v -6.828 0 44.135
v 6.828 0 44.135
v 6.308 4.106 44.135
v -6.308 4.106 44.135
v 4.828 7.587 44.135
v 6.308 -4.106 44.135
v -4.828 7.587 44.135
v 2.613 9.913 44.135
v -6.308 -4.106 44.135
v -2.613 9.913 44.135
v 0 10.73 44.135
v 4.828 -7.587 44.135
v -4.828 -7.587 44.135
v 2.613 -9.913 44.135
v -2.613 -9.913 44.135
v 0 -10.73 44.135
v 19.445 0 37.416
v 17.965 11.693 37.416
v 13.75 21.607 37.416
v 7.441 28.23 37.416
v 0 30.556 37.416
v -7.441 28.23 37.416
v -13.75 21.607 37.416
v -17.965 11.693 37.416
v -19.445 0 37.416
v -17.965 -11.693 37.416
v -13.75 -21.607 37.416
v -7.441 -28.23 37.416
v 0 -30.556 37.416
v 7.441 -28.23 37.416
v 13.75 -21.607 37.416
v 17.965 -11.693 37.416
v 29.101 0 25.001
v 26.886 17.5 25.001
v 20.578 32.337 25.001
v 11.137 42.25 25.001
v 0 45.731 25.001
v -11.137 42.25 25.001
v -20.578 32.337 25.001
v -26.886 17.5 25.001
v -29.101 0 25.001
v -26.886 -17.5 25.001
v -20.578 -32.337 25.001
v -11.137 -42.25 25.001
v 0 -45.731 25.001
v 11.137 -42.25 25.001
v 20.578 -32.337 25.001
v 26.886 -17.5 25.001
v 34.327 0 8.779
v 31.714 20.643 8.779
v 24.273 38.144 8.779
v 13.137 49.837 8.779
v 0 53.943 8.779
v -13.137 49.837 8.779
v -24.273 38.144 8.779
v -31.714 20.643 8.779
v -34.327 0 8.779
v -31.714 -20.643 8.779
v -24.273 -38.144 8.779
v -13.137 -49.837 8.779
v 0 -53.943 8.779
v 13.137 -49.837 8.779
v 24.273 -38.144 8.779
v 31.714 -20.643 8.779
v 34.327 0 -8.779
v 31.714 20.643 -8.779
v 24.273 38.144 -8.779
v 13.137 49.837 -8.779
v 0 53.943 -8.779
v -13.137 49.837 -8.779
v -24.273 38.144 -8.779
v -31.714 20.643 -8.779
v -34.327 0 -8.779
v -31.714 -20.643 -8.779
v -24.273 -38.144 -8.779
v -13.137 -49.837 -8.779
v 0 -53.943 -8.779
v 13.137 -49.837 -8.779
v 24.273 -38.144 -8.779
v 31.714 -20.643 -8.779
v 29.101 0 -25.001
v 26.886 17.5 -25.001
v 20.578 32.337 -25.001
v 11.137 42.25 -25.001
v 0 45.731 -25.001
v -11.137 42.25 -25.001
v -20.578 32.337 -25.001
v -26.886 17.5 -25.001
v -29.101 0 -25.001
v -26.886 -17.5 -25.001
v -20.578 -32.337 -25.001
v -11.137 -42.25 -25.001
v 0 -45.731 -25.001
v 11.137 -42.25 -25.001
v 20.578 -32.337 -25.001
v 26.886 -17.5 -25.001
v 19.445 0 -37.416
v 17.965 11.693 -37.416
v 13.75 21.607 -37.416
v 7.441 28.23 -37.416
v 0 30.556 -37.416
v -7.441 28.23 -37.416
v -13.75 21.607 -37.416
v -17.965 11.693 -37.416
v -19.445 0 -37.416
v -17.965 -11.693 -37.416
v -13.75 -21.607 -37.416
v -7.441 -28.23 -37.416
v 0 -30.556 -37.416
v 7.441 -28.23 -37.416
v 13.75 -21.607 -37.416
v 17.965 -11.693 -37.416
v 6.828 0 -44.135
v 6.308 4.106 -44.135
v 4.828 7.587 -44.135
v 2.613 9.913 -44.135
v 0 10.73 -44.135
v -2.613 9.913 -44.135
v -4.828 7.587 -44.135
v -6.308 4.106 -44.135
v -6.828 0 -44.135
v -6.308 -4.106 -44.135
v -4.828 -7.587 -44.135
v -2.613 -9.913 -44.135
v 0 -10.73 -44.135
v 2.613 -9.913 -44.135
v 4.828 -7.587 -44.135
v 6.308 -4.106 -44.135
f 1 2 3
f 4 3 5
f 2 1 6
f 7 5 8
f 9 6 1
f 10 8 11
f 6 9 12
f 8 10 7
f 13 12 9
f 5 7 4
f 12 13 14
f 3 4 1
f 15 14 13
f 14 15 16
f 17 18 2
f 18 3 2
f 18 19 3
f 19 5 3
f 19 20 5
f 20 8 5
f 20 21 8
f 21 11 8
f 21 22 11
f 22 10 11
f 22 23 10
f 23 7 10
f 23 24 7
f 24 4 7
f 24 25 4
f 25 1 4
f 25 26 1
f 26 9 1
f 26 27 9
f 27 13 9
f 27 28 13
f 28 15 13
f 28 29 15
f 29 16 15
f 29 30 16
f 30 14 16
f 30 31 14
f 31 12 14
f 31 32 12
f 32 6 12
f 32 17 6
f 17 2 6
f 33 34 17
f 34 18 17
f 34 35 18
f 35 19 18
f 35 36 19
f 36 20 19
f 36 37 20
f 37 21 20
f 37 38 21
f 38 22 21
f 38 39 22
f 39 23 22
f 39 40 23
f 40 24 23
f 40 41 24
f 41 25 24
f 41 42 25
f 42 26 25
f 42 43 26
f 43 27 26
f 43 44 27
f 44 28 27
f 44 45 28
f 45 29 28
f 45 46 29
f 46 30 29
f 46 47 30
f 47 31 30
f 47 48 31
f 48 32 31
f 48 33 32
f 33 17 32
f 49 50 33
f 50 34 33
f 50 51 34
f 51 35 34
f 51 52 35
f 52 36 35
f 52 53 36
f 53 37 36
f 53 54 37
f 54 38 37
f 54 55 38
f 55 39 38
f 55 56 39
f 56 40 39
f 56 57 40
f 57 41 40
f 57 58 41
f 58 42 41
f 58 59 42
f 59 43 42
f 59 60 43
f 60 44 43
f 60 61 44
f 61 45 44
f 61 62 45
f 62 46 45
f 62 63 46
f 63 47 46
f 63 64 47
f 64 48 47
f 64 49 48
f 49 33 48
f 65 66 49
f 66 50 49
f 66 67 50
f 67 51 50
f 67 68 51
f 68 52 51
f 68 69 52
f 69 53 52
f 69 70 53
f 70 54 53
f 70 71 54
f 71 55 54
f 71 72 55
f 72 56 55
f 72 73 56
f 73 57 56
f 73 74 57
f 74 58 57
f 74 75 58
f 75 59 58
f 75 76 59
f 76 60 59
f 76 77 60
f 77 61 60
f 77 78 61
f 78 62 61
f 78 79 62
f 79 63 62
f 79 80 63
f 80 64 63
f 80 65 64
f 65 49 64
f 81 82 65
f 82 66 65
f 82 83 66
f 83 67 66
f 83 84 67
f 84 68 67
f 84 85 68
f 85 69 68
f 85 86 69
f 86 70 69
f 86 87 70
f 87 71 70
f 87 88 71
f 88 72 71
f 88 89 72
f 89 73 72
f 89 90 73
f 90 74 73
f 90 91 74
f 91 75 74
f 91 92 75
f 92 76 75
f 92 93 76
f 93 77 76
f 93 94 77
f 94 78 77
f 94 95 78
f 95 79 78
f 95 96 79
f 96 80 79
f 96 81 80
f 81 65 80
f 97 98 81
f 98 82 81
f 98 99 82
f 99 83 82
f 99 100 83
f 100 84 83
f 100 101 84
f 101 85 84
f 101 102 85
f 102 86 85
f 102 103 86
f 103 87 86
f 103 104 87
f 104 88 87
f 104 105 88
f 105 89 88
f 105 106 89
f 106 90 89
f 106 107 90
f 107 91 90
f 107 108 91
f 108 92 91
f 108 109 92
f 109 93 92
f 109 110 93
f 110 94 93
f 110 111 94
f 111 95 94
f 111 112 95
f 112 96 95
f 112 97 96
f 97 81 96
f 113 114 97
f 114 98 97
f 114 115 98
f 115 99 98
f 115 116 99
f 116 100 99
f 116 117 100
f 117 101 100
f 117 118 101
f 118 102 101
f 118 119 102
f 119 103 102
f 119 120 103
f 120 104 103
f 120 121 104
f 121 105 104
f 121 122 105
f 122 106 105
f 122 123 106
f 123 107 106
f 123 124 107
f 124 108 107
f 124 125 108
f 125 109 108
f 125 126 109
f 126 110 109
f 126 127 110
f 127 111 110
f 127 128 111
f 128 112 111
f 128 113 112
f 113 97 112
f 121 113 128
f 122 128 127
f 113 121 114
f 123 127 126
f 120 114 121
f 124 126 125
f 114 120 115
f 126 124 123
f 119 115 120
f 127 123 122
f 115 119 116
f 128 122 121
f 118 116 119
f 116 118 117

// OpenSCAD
// Generated by SolidPython 1.0.1 on 2020-07-29 00:46:47


scale(v = [7, 11, 9]) {
	sphere(r = 5);
}
/***********************************************
*********      SolidPython code:      **********
************************************************
 
# import packages: SolidPython
from solid import *
from solid.utils import *
from itertools import chain, combinations, permutations


class Resize:

    def __init__(self, scad_file):
        self.scad_file = scad_file
        #self.scad_file = import_scad(scad_file)
        # cone/cylinder param:
        self.r1 = 0
        self.r2 = 0
        self.h = 0
        # rectangular prism param:
        self.w = 0
        self.l = 0
        # ellipse param:
        self.r = 0

    # import OpenScad code (file name corresponds to shape)


    # classify shape + parameters
    def assign(self, param1, param2, param3):
        if self.scad_file == 'cone.scad':
            self.r1 = param1
            self.r2 = param2
            self.h = param3
        elif self.scad_file == 'cylinder.scad':
            self.r1 = param1
            self.r2 = param2
            self.h = param3
        elif self.scad_file == 'rectangularPrism.scad':
            self.h = param1
            self.l = param2
            self.w = param3
        else:
            self.r = param1
            self.h = param2

    # resize parameters
    def iterate(self):
        x = range(3, 20, 2)
        i = 1
        if self.scad_file == 'cone.scad':
            tempList = list(permutations(x, 2))
            for temp in tempList:
                param1 = temp[0]
                param2 = temp[1]
                filepath = 'produced_scad_files/' + 'cone' + str(param1) + '_' + str(param2) + '_' + '.scad'
                scad_render_to_file(cylinder(h=param1, r1=param2, r2=0), filepath)

        elif self.scad_file == 'cylinder.scad':
            tempList = list(permutations(x, 3))
            for temp in tempList:
                param1 = temp[0]
                param2 = temp[1]
                filepath = 'produced_scad_files/' + 'cylinder' + str(param1) + '_' + str(param2) + '_' + '.scad'
                scad_render_to_file(cylinder(h=param1, r1=param2, r2=param2), filepath)

        elif self.scad_file == 'rectangularPrism.scad':
            tempList = list(permutations(x, 3))
            for temp in tempList:
                param1 = temp[0]
                param2 = temp[1]
                param3 = temp[2]
                filepath = 'produced_scad_files/' + 'rectangularPrism' + str(param1) + '_' + str(param2) + '_' + str(
                    param3) + '.scad'
                scad_render_to_file(cube(size=(param1, param2, param3)), filepath)

        elif self.scad_file == 'ellipse.scad':
            tempList = list(permutations(x, 4))
            for temp in tempList:
                param1 = temp[0]
                param2 = temp[1]
                param3 = temp[2]
                param4 = temp[3]
                filepath = 'produced_scad_files/' + 'ellipse' + str(param1) + '_' + str(param2) + '_' + str(param3) + '_' + str(param4) + '.scad'
                scad_render_to_file(scale([param1, param2, param3])(sphere(r=param4)), filepath)

    def render_to_scadfile(self):
        scad_render_to_file(scad, 'example.scad') 
 
************************************************/
